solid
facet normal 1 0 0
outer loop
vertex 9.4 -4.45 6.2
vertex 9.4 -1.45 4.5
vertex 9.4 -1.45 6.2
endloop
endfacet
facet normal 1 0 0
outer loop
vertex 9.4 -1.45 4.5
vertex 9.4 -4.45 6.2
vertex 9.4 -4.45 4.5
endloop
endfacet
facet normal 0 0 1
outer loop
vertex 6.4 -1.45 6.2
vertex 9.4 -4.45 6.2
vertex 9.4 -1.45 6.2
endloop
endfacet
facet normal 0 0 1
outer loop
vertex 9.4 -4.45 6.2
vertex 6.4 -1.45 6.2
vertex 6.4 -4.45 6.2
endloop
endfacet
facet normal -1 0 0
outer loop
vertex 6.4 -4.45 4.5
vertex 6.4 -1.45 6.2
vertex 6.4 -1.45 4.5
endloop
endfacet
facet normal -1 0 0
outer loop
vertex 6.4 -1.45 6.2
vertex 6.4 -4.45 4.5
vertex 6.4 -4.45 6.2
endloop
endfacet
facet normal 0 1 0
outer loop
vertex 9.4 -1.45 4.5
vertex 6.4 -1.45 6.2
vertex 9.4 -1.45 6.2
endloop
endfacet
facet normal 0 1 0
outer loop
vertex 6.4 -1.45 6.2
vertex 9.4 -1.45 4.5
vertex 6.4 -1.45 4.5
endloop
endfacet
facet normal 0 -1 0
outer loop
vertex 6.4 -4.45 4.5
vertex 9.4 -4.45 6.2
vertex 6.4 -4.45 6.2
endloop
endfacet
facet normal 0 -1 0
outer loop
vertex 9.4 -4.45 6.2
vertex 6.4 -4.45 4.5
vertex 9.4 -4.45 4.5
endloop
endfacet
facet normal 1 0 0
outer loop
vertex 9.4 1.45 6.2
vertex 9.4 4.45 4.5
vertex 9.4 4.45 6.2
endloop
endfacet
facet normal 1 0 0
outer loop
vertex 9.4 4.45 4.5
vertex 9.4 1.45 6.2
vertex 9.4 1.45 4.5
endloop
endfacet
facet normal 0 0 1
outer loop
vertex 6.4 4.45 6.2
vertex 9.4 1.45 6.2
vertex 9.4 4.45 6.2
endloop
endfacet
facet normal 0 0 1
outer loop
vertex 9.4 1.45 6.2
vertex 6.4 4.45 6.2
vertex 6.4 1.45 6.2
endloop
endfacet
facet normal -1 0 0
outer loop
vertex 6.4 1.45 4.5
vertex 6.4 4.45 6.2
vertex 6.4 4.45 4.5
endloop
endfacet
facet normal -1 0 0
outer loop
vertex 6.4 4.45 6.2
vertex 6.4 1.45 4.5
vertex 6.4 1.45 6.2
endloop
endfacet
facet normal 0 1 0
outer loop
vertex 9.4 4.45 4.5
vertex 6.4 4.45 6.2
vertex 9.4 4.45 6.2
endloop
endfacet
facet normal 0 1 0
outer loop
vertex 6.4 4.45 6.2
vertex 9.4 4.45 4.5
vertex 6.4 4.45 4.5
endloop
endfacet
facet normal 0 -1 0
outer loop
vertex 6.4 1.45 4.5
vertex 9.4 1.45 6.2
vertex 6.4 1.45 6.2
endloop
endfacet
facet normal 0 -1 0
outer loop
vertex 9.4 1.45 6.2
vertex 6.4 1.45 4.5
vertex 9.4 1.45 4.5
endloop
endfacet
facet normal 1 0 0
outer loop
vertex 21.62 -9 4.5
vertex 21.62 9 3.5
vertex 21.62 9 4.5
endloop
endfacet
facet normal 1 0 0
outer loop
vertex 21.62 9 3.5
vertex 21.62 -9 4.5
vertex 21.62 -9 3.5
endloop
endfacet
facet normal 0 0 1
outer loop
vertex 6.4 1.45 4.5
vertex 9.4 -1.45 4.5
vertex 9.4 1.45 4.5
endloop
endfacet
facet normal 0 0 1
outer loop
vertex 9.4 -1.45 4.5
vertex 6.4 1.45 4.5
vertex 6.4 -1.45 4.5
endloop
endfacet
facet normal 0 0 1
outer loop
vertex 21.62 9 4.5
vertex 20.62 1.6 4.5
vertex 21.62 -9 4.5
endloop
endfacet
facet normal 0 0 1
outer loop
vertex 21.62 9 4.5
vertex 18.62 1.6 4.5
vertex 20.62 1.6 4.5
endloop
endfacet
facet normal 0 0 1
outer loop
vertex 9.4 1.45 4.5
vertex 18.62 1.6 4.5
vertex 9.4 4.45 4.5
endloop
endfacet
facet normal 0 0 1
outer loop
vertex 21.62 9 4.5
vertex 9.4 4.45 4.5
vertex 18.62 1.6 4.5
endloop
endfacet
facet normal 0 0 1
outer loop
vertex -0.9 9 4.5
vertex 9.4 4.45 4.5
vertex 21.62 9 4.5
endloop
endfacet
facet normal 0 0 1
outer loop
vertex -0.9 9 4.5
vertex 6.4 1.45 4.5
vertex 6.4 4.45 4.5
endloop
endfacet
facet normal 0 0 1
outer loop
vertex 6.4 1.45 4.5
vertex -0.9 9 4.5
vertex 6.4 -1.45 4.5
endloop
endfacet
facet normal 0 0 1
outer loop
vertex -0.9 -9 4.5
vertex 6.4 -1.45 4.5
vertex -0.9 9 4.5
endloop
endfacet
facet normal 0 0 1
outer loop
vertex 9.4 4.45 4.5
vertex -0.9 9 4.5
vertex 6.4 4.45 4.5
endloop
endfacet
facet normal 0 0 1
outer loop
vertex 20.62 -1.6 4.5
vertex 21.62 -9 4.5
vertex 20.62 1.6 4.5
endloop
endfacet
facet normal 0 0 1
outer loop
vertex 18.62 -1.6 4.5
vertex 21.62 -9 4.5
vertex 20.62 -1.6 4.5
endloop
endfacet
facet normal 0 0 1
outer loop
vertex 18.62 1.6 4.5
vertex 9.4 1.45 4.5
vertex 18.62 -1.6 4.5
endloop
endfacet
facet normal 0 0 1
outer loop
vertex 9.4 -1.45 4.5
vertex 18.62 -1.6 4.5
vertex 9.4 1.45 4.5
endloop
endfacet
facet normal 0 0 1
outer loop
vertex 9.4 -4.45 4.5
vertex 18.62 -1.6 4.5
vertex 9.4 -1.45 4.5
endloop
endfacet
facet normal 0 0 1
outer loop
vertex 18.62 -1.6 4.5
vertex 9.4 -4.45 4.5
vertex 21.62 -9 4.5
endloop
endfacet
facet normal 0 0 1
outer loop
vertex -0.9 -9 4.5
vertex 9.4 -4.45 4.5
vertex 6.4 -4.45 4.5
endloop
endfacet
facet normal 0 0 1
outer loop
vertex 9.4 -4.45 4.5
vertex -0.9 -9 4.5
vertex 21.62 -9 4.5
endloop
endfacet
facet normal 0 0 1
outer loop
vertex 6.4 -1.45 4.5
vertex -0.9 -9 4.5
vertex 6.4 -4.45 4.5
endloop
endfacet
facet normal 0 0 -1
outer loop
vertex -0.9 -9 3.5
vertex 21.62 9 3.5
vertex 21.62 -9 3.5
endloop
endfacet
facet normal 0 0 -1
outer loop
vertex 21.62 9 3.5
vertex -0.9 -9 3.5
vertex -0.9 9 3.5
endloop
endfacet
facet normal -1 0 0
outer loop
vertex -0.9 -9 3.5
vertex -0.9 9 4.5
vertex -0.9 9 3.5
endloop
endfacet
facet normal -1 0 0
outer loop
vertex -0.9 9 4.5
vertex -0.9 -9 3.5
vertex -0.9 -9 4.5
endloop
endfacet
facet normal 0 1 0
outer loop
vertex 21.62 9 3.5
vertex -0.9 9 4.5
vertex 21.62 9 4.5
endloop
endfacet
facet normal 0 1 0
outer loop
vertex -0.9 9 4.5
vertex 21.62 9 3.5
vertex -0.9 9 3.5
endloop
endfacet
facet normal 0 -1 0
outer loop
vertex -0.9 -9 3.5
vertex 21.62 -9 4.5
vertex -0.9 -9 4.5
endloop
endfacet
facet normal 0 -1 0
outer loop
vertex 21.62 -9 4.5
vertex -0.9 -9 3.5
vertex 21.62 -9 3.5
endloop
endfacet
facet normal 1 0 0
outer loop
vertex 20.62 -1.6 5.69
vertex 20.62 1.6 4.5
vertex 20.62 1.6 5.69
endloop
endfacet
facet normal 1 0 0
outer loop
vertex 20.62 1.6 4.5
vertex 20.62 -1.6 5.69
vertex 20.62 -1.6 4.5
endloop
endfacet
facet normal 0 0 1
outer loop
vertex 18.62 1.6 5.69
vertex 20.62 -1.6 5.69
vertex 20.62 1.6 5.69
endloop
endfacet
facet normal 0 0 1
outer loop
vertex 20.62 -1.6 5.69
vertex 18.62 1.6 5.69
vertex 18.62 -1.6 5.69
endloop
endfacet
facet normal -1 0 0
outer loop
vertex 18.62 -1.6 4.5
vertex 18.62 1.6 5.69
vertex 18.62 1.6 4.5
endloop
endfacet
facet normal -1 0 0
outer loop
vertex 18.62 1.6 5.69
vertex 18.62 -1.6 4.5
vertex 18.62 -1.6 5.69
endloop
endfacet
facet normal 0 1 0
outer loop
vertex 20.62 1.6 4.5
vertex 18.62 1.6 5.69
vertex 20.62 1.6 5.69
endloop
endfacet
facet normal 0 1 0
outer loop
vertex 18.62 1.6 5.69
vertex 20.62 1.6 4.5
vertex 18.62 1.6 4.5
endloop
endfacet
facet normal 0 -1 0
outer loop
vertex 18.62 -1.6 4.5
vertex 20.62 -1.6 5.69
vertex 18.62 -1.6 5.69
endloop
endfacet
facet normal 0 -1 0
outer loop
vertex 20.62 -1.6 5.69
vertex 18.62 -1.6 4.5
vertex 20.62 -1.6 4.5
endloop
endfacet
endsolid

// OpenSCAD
// file: ../../usb-c-port/usb-c-port.scad
//-----------------------------------------------------------------------
// USB-C port through a wall, flush: the socket's metal shell sits in a
// close-fitting pocket in the wall, walled in on all four sides, its face
// level with the outside. The cable seats the way it does on a laptop.
//
// A board's socket only overhangs the board edge by a mm or so, less than
// the wall. So the board's end tucks into a shallow relief in the wall's
// inner face, the width of the board, leaving the wall round the socket
// thin enough for the face to reach the outside. When that would leave less
// than usbcMinWall (a socket that barely overhangs), the face sits back from
// the outside instead: usbcRecess() says how far.
//
// Modules, all in the same frame:
//   usbcGhost()     the socket and the board's end, for previews
//   usbcWallCut()   subtract from the wall: socket pocket and board relief
//
// Frame: origin on the floor top at the wall's inner face, under the socket's
// axis. +X into the box, Z up. The wall is X = -wall .. 0. The board is
// component side up, socket on top (top-mount, as on the FireBeetle, C3 Super
// Mini and S3 DevKitC). Units: mm.
//
// usbcBoardEdgeX() gives where the board's edge lands (negative: inside the
// wall), so a holder can put its posts or pocket to match.
//-----------------------------------------------------------------------

//-- The socket: USB-C receptacle shell (USB-IF 8.34 x 2.56 plug, receptacle shell ~8.94 x 3.26)
usbcShellW     = 8.94;
usbcShellH     = 3.26;    // CAL per board: measured 3.2 on the FireBeetle
usbcShellR     = 1.2;     // CAL: end radius. Full round would be 1.63; most shells are squarer
usbcShellDepth = 7.35;    // face to back

//-- The pocket
usbcClearance  = 0.15;    // CAL: per side, shell to pocket. Set by the fit piece
usbcMinWall    = 1.0;     // thinnest wall left round the socket
usbcReliefGap  = 0.3;     // board relief over the board, each side and above/below
usbcChamfer    = 0.3;     // lead-in on the outside edge

//-- How far the socket face sits back from the outside: 0 (flush) unless the socket
//-- overhangs the board edge by less than usbcMinWall
function usbcRecess(overhang, minWall = usbcMinWall) = max(0, minWall - overhang);
//-- X of the board's socket edge in this frame
function usbcBoardEdgeX(wall, overhang, recess) =
  -wall + (is_undef(recess) ? usbcRecess(overhang) : recess) + overhang;
//-- Z of the board's underside above the floor top
function usbcBoardZ(axisZ, pcb, shellH = usbcShellH) = axisZ - shellH/2 - pcb;

module usbcShell2D(grow = 0, w = usbcShellW, h = usbcShellH, r = usbcShellR)
{
  offset(r = r + grow, $fn = 24) square([w - 2*r, h - 2*r], center = true);
}

//-- axisZ: socket axis above the floor. boardW/pcb: the board, for the ghost and relief.
//-- shift: socket centre across the board's width from the board's centre line (+Y)
module usbcGhost(axisZ, wall, overhang, boardW, pcb = 1.6, recess, shift = 0, shellH = usbcShellH, shellW = usbcShellW)
{
  ex = usbcBoardEdgeX(wall, overhang, recess);
  %color("Silver") translate([ex - overhang, 0, axisZ]) rotate([0, 90, 0]) rotate([0, 0, 90])
    linear_extrude(usbcShellDepth) usbcShell2D(w = shellW, h = shellH);
  %color("DarkSlateGray") translate([ex, -boardW/2 - shift, usbcBoardZ(axisZ, pcb, shellH)]) cube([12, boardW, pcb]);
}

module usbcWallCut(axisZ, wall, overhang, boardW, pcb = 1.6, recess, shift = 0,
                   clearance = usbcClearance, shellH = usbcShellH, shellW = usbcShellW, aboveBoard)
{
  rc = is_undef(recess) ? usbcRecess(overhang) : recess;
  ex = usbcBoardEdgeX(wall, overhang, rc);
  bz = usbcBoardZ(axisZ, pcb, shellH);
  //-- what stands on the board near its edge: the socket, unless told taller
  up = is_undef(aboveBoard) ? shellH : aboveBoard;
  assert(ex - overhang + wall >= -0.01, "socket face would stand proud of the wall");
  assert(rc > 0 || overhang >= usbcMinWall - 0.01, "wall round the socket under usbcMinWall");
  //-- socket pocket, through the wall
  translate([-wall - 1, 0, axisZ]) rotate([0, 90, 0]) rotate([0, 0, 90])
    linear_extrude(wall + 2) usbcShell2D(clearance, w = shellW, h = shellH);
  //-- lead-in chamfer on the outside
  translate([-wall, 0, axisZ]) rotate([0, 90, 0]) rotate([0, 0, 90])
    hull()
    {
      translate([0, 0, -0.01]) linear_extrude(0.01) usbcShell2D(clearance + usbcChamfer, w = shellW, h = shellH);
      translate([0, 0, usbcChamfer]) linear_extrude(0.01) usbcShell2D(clearance, w = shellW, h = shellH);
    }
  //-- board relief in the inner face, when the board's edge lands inside the wall
  if (ex < 0)
    translate([ex - usbcReliefGap, -boardW/2 - shift - usbcReliefGap, bz - usbcReliefGap])
      cube([-ex + usbcReliefGap + 1, boardW + 2*usbcReliefGap, pcb + up + 2*usbcReliefGap]);
}
// file: ../../board-pocket/board-pocket.scad
//-----------------------------------------------------------------------
// Board pocket: holds a board that has no mounting holes
//
// The board sits on a central pedestal with a pad of double-sided foam tape
// on top, inside a low wall that follows its outline. The pedestal keeps
// the board's edges off the floor, so lead stubs soldered through the edge
// holes have room underneath; gaps in the wall let the leads out. The wall
// only locates the board: the tape holds it down, and in a closed box a lid
// pad presses a pad of foam onto it (boardLidPad below).
//
// Modules, all in the same frame:
//   boardPocketGhost()   the board and its tape, for previews
//   boardPocketHolder()  the plastic: pedestal and outline wall, add to the floor
//   boardLidPad()        a block hanging from the lid that presses foam onto the board
//   boardLidPadGhost()   the foam under it, squashed, for previews
//
// Frame: origin on the floor top, under the centre of the board's outline.
// X along the board's length l, Y across its width w, Z up. Units: mm.
//
// Sides are listed [-X, +X, -Y, +Y], each one of
//   "gap"    wall with a gap in the middle for leads (gapW wide)
//   "solid"  whole wall: use it where the board takes a push (a plug)
//   "open"   no wall: the board's edge goes into a box wall (a USB port)
//
// Used by esp32-c3-supermini, esp32-s3-devkitc and rs485-max485.
//-----------------------------------------------------------------------

//-- From the controller project's receiver.scad / rack-end.scad (boardPocket), 2026-10-30
bpPedestal  = 2.5;     // floor to the tape: room for lead stubs under the board edges
bpTape      = 1.0;     // double-sided foam tape on the pedestal. CAL: how far it squashes
bpWall      = 1.2;     // outline wall thickness
bpRise      = 1.0;     // wall top above the PCB underside (the controller project's rack-end: 0.8 under the S3's module)
bpClearance = 0.4;     // per side, board outline to wall: PETG. 0.3 for PLA. Set by the fit piece
bpGapW      = 6;       // lead gap in a "gap" side
bpPadInset  = 4;       // default pedestal: the board less this all round

//-- Lid hold-down (the controller project's receiver / rack-end lid pads)
bpFoam      = 3.0;     // CAL: self-adhesive foam stuck under each lid pad
bpSqueeze   = 1.0;     // how far the lid squashes it: ~1/3 for soft foam, 0.3 for felt

//-- PCB underside above the floor top
function boardPocketZ(pedestal = bpPedestal, tape = bpTape) = pedestal + tape;
//-- default pedestal [l, w] for a board
function boardPocketPad(l, w, inset = bpPadInset) = [max(l - 2*inset, 4), max(w - 2*inset, 4)];
//-- Z of a lid pad's underside, pressing on a surface at surfaceZ (board top, or a part on it)
function boardLidPadZ(surfaceZ, foam = bpFoam, squeeze = bpSqueeze) =
  assert(squeeze > 0 && squeeze < foam, "foam would not touch the board")
  surfaceZ + foam - squeeze;

function bpSides4(s) = is_list(s) ? s : [s, s, s, s];

module boardPocketGhost(l, w, pcb = 1.6, pad, pedestal = bpPedestal, tape = bpTape)
{
  p = is_undef(pad) ? boardPocketPad(l, w) : pad;
  %color("White") translate([-p[0]/2, -p[1]/2, pedestal]) cube([p[0], p[1], tape]);
  %color("DarkGreen") translate([-l/2, -w/2, pedestal + tape]) cube([l, w, pcb]);
}

//-- pad: pedestal [l, w]; gapW a number or one per side
module boardPocketHolder(l, w, pad, sides = "gap", gapW = bpGapW, clearance = bpClearance,
                         pedestal = bpPedestal, tape = bpTape, wall = bpWall, rise = bpRise)
{
  p   = is_undef(pad) ? boardPocketPad(l, w) : pad;
  s   = bpSides4(sides);
  g   = bpSides4(gapW);
  ix  = l/2 + clearance;                 // inner half sizes
  iy  = w/2 + clearance;
  top = pedestal + tape + rise;
  assert(p[0] <= l && p[1] <= w, "pedestal bigger than the board");
  for (k = s) assert(k == "gap" || k == "solid" || k == "open", str("unknown side ", k));

  //-- pedestal, centred under the board
  translate([-p[0]/2, -p[1]/2, -0.01]) cube([p[0], p[1], pedestal + 0.01]);
  //-- outline wall
  difference()
  {
    translate([-ix - wall, -iy - wall, -0.01]) cube([2*(ix + wall), 2*(iy + wall), top + 0.01]);
    translate([-ix, -iy, -1]) cube([2*ix, 2*iy, top + 2]);
    for (i = [0 : 3])
    {
      //-- each side's cut, drawn for -X then turned into place
      ax = (i < 2) ? ix : iy;         // inner half size across the side
      al = (i < 2) ? iy : ix;         // half length along it
      rotate([0, 0, [0, 180, 90, 270][i]])   // -X, +X, -Y, +Y
      {
        if (s[i] == "gap")
          translate([-ax - wall - 1, -g[i]/2, -1]) cube([wall + 2, g[i], top + 2]);
        if (s[i] == "open")
          translate([-ax - wall - 1, -al - wall - 1, -1]) cube([wall + 1.01, 2*(al + wall + 1), top + 2]);
      }
    }
  }
}

//-- A lid pad over the rectangle size [x, y] centred at `at`, from the squashed foam up to
//-- lidZ (the lid's inner face in this frame), running `into` up into the lid plate
module boardLidPad(size, at = [0, 0], surfaceZ, lidZ, foam = bpFoam, squeeze = bpSqueeze, into = 0.5)
{
  z0 = boardLidPadZ(surfaceZ, foam, squeeze);
  assert(lidZ > z0, "lid is below the pad: the box is too low for the foam");
  translate([at[0] - size[0]/2, at[1] - size[1]/2, z0]) cube([size[0], size[1], lidZ - z0 + into]);
}

module boardLidPadGhost(size, at = [0, 0], surfaceZ, foam = bpFoam, squeeze = bpSqueeze)
{
  %color("Gray") translate([at[0] - size[0]/2, at[1] - size[1]/2, surfaceZ]) cube([size[0], size[1], foam - squeeze]);
}
// file: ../esp32-c3-supermini.scad
//-----------------------------------------------------------------------
// ESP32-C3 Super Mini, USB-C through a wall
//
// The board has no mounting holes. It sits on a taped pedestal inside an
// outline pocket (board-pocket), with its USB-C socket in a flush pocket in
// the box wall (usb-c-port). The pocket is open at the wall, where the board's
// end tucks into the wall's relief, and whole at the antenna end, which takes
// the plug's push. Its long sides have gaps for the leads.
//
// To fit: tip the board nose-down a few degrees, put the socket into the
// wall, then lay the antenna end down onto the tape.
//
// Modules, all in the same frame:
//   c3MiniGhost()    the board, socket, buttons and antenna, for previews
//   c3MiniHolder()   the plastic: pedestal and outline pocket, add to the floor
//   c3MiniWallCut()  subtract from the wall: the socket pocket and board relief
//   c3MiniLidPads()  blocks under the lid that press foam onto the board
//
// Frame (as usb-c-port): origin on the floor top at the wall's inner face,
// under the socket's axis. +X into the box (toward the antenna end), Z up.
// The wall is X = -wall .. 0. Units: mm.
//
// The socket height isn't chosen: it follows from the pedestal, the tape and
// the PCB (c3MiniAxisZ). Sizes: pick a row of c3Variants by name, or pass
// length / pcb to override one value.
//-----------------------------------------------------------------------

//-- included, not used, so their default values (bpTape, usbcClearance...) are in scope here
include <../board-pocket/board-pocket.scad>
include <../usb-c-port/usb-c-port.scad>

//-- [name, length, width, pcb, USB-C overhang]. Source: the controller project's parts sheet
c3Variants = [
  ["supermini",     22.52, 18.0, 1.0, 1.5],   // diymore 4-pack B0DS23ML1L: STEP outline, PCB CAL (model 0.9)
  ["supermini-1.6", 22.52, 18.0, 1.6, 1.5],   // sellers listing a 1.6 PCB
  ["supermini-24",  24.0,  18.0, 1.0, 1.5],   // longest seller listing (22.5-24): CAL
  ["supermini-plus",22.52, 18.0, 1.0, 1.5],   // SuperMini Plus (V2): same footprint (mischianti.org); rest CAL
];
c3Variant     = "supermini";

//-- The socket: 9.0 x 3.12 on the STEP. The wall pocket uses usb-c-port's 8.94 shell
c3UsbW        = 9.0;      // from the STEP: its wall pocket is cut to this
c3UsbH        = 3.12;     // CAL
c3UsbDepth    = 7.35;     // ghost only: usb-c-port's typical shell
c3PortClear   = usbcClearance;   // per side, shell to wall pocket: usb-c-port's, set by its fit piece

//-- On the board (ghost and lid pads)
c3ButtonX     = 8.8;      // BOOT / RST centres from the USB edge
c3ButtonY     = 2.95;     // either side of the centre line
c3ButtonH     = 1.7;
c3ButtonSize  = 3.0;      // CAL: ghost only
c3AntennaSize = [2.0, 3.2, 1.2];   // CAL: ceramic chip at the far end, ghost only
c3PinPitch    = 15.24;    // header rows, along the long sides

//-- Holder
c3Pad         = [14, 10]; // pedestal: between the pin rows (the controller project's receiver.scad)
c3Sides       = ["open", "solid", "gap", "gap"];   // wall end, antenna end, long sides

function c3Mini(name = c3Variant) = let (i = search([name], c3Variants)[0])
  assert(i != [] && i != undef, str("unknown C3 variant ", name)) c3Variants[i];
//-- [length, width, pcb, overhang] with overrides
function c3MiniDims(variant = c3Variant, length, pcb) = let (v = c3Mini(variant))
  [is_undef(length) ? v[1] : length, v[2], is_undef(pcb) ? v[3] : pcb, v[4]];
function c3MiniAxisZ(pcb, pedestal = bpPedestal, tape = bpTape) =
  boardPocketZ(pedestal, tape) + pcb + c3UsbH/2;
//-- X of the board's USB edge (negative: inside the wall's relief)
function c3MiniEdgeX(wall, variant = c3Variant) = usbcBoardEdgeX(wall, c3Mini(variant)[4]);

module c3MiniGhost(wall, variant = c3Variant, length, pcb, pedestal = bpPedestal, tape = bpTape)
{
  d  = c3MiniDims(variant, length, pcb);
  ex = usbcBoardEdgeX(wall, d[3]);
  bz = boardPocketZ(pedestal, tape);
  top = bz + d[2];
  translate([ex + d[0]/2, 0, 0]) boardPocketGhost(d[0], d[1], d[2], c3Pad, pedestal, tape);
  %color("Silver") translate([ex - d[3], 0, top + c3UsbH/2]) rotate([0, 90, 0]) rotate([0, 0, 90])
    linear_extrude(c3UsbDepth) usbcShell2D(w = c3UsbW, h = c3UsbH);
  for (s = [-1, 1])
    %color("Black") translate([ex + c3ButtonX - c3ButtonSize/2, s*c3ButtonY - c3ButtonSize/2, top])
      cube([c3ButtonSize, c3ButtonSize, c3ButtonH]);
  %color("Tan") translate([ex + d[0] - 1 - c3AntennaSize[0], -c3AntennaSize[1]/2, top]) cube(c3AntennaSize);
}

module c3MiniHolder(wall, variant = c3Variant, length, pcb, clearance = bpClearance,
                    pedestal = bpPedestal, tape = bpTape, rise = bpRise)
{
  d  = c3MiniDims(variant, length, pcb);
  ex = usbcBoardEdgeX(wall, d[3]);
  //-- the pocket's wall end is open; anything left inside the wall goes
  intersection()
  {
    translate([ex + d[0]/2, 0, 0])
      boardPocketHolder(d[0], d[1], c3Pad, c3Sides, clearance = clearance,
                        pedestal = pedestal, tape = tape, rise = rise);
    translate([0, -50, -1]) cube([100, 100, 50]);
  }
}

module c3MiniWallCut(wall, variant = c3Variant, length, pcb, portClear = c3PortClear,
                     pedestal = bpPedestal, tape = bpTape)
{
  d = c3MiniDims(variant, length, pcb);
  usbcWallCut(c3MiniAxisZ(d[2], pedestal, tape), wall, d[3], d[1], d[2],
              clearance = portClear, shellH = c3UsbH, shellW = c3UsbW);
}

//-- Lid pads (the controller project's receiver): one across the antenna end, a narrow one on the socket
//-- that keeps the foam off BOOT/RST. lidZ: the lid's inner face above the floor top.
module c3MiniLidPads(wall, lidZ, variant = c3Variant, length, pcb, foam = bpFoam, squeeze = bpSqueeze,
                     pedestal = bpPedestal, tape = bpTape)
{
  d   = c3MiniDims(variant, length, pcb);
  ex  = usbcBoardEdgeX(wall, d[3]);
  top = boardPocketZ(pedestal, tape) + d[2];
  boardLidPad([5, d[1] - 6], [ex + d[0] - 3.5, 0], top, lidZ, foam, squeeze);
  boardLidPad([4, 5], [max(ex - d[3], 0) + 0.5 + 2, 0], top + c3UsbH, lidZ, foam, squeeze);
}
// main file
// The board as solids, for the catalogue (the Ghost is % so it never renders).
// part = "board" (PCB, buttons, antenna) | "socket"; n boards at the fit piece's pitch and tapes
include <../esp32-c3-supermini.scad>

wall  = 2.4;
part  = "board";
n     = 1;
pitch = 26;
tapes = [0.7, 0.85, 1.0, 1.0];

module c3Solid(tape)
{
  d   = c3MiniDims();
  ex  = c3MiniEdgeX(wall);
  bz  = boardPocketZ(tape = tape);
  top = bz + d[2];
  if (part == "board")
  {
    translate([ex, -d[1]/2, bz]) cube([d[0], d[1], d[2]]);
    for (s = [-1, 1])
      translate([ex + c3ButtonX - c3ButtonSize/2, s*c3ButtonY - c3ButtonSize/2, top - 0.01])
        cube([c3ButtonSize, c3ButtonSize, c3ButtonH + 0.01]);
    translate([ex + d[0] - 1 - c3AntennaSize[0], -c3AntennaSize[1]/2, top - 0.01]) cube(c3AntennaSize);
  }
  if (part == "socket")
    translate([ex - d[3], 0, top + c3UsbH/2]) rotate([0, 90, 0]) rotate([0, 0, 90])
      linear_extrude(c3UsbDepth) usbcShell2D(h = c3UsbH);
}

for (i = [0 : n - 1]) translate([0, i*pitch, 0]) c3Solid(n == 1 ? bpTape : tapes[i]);
